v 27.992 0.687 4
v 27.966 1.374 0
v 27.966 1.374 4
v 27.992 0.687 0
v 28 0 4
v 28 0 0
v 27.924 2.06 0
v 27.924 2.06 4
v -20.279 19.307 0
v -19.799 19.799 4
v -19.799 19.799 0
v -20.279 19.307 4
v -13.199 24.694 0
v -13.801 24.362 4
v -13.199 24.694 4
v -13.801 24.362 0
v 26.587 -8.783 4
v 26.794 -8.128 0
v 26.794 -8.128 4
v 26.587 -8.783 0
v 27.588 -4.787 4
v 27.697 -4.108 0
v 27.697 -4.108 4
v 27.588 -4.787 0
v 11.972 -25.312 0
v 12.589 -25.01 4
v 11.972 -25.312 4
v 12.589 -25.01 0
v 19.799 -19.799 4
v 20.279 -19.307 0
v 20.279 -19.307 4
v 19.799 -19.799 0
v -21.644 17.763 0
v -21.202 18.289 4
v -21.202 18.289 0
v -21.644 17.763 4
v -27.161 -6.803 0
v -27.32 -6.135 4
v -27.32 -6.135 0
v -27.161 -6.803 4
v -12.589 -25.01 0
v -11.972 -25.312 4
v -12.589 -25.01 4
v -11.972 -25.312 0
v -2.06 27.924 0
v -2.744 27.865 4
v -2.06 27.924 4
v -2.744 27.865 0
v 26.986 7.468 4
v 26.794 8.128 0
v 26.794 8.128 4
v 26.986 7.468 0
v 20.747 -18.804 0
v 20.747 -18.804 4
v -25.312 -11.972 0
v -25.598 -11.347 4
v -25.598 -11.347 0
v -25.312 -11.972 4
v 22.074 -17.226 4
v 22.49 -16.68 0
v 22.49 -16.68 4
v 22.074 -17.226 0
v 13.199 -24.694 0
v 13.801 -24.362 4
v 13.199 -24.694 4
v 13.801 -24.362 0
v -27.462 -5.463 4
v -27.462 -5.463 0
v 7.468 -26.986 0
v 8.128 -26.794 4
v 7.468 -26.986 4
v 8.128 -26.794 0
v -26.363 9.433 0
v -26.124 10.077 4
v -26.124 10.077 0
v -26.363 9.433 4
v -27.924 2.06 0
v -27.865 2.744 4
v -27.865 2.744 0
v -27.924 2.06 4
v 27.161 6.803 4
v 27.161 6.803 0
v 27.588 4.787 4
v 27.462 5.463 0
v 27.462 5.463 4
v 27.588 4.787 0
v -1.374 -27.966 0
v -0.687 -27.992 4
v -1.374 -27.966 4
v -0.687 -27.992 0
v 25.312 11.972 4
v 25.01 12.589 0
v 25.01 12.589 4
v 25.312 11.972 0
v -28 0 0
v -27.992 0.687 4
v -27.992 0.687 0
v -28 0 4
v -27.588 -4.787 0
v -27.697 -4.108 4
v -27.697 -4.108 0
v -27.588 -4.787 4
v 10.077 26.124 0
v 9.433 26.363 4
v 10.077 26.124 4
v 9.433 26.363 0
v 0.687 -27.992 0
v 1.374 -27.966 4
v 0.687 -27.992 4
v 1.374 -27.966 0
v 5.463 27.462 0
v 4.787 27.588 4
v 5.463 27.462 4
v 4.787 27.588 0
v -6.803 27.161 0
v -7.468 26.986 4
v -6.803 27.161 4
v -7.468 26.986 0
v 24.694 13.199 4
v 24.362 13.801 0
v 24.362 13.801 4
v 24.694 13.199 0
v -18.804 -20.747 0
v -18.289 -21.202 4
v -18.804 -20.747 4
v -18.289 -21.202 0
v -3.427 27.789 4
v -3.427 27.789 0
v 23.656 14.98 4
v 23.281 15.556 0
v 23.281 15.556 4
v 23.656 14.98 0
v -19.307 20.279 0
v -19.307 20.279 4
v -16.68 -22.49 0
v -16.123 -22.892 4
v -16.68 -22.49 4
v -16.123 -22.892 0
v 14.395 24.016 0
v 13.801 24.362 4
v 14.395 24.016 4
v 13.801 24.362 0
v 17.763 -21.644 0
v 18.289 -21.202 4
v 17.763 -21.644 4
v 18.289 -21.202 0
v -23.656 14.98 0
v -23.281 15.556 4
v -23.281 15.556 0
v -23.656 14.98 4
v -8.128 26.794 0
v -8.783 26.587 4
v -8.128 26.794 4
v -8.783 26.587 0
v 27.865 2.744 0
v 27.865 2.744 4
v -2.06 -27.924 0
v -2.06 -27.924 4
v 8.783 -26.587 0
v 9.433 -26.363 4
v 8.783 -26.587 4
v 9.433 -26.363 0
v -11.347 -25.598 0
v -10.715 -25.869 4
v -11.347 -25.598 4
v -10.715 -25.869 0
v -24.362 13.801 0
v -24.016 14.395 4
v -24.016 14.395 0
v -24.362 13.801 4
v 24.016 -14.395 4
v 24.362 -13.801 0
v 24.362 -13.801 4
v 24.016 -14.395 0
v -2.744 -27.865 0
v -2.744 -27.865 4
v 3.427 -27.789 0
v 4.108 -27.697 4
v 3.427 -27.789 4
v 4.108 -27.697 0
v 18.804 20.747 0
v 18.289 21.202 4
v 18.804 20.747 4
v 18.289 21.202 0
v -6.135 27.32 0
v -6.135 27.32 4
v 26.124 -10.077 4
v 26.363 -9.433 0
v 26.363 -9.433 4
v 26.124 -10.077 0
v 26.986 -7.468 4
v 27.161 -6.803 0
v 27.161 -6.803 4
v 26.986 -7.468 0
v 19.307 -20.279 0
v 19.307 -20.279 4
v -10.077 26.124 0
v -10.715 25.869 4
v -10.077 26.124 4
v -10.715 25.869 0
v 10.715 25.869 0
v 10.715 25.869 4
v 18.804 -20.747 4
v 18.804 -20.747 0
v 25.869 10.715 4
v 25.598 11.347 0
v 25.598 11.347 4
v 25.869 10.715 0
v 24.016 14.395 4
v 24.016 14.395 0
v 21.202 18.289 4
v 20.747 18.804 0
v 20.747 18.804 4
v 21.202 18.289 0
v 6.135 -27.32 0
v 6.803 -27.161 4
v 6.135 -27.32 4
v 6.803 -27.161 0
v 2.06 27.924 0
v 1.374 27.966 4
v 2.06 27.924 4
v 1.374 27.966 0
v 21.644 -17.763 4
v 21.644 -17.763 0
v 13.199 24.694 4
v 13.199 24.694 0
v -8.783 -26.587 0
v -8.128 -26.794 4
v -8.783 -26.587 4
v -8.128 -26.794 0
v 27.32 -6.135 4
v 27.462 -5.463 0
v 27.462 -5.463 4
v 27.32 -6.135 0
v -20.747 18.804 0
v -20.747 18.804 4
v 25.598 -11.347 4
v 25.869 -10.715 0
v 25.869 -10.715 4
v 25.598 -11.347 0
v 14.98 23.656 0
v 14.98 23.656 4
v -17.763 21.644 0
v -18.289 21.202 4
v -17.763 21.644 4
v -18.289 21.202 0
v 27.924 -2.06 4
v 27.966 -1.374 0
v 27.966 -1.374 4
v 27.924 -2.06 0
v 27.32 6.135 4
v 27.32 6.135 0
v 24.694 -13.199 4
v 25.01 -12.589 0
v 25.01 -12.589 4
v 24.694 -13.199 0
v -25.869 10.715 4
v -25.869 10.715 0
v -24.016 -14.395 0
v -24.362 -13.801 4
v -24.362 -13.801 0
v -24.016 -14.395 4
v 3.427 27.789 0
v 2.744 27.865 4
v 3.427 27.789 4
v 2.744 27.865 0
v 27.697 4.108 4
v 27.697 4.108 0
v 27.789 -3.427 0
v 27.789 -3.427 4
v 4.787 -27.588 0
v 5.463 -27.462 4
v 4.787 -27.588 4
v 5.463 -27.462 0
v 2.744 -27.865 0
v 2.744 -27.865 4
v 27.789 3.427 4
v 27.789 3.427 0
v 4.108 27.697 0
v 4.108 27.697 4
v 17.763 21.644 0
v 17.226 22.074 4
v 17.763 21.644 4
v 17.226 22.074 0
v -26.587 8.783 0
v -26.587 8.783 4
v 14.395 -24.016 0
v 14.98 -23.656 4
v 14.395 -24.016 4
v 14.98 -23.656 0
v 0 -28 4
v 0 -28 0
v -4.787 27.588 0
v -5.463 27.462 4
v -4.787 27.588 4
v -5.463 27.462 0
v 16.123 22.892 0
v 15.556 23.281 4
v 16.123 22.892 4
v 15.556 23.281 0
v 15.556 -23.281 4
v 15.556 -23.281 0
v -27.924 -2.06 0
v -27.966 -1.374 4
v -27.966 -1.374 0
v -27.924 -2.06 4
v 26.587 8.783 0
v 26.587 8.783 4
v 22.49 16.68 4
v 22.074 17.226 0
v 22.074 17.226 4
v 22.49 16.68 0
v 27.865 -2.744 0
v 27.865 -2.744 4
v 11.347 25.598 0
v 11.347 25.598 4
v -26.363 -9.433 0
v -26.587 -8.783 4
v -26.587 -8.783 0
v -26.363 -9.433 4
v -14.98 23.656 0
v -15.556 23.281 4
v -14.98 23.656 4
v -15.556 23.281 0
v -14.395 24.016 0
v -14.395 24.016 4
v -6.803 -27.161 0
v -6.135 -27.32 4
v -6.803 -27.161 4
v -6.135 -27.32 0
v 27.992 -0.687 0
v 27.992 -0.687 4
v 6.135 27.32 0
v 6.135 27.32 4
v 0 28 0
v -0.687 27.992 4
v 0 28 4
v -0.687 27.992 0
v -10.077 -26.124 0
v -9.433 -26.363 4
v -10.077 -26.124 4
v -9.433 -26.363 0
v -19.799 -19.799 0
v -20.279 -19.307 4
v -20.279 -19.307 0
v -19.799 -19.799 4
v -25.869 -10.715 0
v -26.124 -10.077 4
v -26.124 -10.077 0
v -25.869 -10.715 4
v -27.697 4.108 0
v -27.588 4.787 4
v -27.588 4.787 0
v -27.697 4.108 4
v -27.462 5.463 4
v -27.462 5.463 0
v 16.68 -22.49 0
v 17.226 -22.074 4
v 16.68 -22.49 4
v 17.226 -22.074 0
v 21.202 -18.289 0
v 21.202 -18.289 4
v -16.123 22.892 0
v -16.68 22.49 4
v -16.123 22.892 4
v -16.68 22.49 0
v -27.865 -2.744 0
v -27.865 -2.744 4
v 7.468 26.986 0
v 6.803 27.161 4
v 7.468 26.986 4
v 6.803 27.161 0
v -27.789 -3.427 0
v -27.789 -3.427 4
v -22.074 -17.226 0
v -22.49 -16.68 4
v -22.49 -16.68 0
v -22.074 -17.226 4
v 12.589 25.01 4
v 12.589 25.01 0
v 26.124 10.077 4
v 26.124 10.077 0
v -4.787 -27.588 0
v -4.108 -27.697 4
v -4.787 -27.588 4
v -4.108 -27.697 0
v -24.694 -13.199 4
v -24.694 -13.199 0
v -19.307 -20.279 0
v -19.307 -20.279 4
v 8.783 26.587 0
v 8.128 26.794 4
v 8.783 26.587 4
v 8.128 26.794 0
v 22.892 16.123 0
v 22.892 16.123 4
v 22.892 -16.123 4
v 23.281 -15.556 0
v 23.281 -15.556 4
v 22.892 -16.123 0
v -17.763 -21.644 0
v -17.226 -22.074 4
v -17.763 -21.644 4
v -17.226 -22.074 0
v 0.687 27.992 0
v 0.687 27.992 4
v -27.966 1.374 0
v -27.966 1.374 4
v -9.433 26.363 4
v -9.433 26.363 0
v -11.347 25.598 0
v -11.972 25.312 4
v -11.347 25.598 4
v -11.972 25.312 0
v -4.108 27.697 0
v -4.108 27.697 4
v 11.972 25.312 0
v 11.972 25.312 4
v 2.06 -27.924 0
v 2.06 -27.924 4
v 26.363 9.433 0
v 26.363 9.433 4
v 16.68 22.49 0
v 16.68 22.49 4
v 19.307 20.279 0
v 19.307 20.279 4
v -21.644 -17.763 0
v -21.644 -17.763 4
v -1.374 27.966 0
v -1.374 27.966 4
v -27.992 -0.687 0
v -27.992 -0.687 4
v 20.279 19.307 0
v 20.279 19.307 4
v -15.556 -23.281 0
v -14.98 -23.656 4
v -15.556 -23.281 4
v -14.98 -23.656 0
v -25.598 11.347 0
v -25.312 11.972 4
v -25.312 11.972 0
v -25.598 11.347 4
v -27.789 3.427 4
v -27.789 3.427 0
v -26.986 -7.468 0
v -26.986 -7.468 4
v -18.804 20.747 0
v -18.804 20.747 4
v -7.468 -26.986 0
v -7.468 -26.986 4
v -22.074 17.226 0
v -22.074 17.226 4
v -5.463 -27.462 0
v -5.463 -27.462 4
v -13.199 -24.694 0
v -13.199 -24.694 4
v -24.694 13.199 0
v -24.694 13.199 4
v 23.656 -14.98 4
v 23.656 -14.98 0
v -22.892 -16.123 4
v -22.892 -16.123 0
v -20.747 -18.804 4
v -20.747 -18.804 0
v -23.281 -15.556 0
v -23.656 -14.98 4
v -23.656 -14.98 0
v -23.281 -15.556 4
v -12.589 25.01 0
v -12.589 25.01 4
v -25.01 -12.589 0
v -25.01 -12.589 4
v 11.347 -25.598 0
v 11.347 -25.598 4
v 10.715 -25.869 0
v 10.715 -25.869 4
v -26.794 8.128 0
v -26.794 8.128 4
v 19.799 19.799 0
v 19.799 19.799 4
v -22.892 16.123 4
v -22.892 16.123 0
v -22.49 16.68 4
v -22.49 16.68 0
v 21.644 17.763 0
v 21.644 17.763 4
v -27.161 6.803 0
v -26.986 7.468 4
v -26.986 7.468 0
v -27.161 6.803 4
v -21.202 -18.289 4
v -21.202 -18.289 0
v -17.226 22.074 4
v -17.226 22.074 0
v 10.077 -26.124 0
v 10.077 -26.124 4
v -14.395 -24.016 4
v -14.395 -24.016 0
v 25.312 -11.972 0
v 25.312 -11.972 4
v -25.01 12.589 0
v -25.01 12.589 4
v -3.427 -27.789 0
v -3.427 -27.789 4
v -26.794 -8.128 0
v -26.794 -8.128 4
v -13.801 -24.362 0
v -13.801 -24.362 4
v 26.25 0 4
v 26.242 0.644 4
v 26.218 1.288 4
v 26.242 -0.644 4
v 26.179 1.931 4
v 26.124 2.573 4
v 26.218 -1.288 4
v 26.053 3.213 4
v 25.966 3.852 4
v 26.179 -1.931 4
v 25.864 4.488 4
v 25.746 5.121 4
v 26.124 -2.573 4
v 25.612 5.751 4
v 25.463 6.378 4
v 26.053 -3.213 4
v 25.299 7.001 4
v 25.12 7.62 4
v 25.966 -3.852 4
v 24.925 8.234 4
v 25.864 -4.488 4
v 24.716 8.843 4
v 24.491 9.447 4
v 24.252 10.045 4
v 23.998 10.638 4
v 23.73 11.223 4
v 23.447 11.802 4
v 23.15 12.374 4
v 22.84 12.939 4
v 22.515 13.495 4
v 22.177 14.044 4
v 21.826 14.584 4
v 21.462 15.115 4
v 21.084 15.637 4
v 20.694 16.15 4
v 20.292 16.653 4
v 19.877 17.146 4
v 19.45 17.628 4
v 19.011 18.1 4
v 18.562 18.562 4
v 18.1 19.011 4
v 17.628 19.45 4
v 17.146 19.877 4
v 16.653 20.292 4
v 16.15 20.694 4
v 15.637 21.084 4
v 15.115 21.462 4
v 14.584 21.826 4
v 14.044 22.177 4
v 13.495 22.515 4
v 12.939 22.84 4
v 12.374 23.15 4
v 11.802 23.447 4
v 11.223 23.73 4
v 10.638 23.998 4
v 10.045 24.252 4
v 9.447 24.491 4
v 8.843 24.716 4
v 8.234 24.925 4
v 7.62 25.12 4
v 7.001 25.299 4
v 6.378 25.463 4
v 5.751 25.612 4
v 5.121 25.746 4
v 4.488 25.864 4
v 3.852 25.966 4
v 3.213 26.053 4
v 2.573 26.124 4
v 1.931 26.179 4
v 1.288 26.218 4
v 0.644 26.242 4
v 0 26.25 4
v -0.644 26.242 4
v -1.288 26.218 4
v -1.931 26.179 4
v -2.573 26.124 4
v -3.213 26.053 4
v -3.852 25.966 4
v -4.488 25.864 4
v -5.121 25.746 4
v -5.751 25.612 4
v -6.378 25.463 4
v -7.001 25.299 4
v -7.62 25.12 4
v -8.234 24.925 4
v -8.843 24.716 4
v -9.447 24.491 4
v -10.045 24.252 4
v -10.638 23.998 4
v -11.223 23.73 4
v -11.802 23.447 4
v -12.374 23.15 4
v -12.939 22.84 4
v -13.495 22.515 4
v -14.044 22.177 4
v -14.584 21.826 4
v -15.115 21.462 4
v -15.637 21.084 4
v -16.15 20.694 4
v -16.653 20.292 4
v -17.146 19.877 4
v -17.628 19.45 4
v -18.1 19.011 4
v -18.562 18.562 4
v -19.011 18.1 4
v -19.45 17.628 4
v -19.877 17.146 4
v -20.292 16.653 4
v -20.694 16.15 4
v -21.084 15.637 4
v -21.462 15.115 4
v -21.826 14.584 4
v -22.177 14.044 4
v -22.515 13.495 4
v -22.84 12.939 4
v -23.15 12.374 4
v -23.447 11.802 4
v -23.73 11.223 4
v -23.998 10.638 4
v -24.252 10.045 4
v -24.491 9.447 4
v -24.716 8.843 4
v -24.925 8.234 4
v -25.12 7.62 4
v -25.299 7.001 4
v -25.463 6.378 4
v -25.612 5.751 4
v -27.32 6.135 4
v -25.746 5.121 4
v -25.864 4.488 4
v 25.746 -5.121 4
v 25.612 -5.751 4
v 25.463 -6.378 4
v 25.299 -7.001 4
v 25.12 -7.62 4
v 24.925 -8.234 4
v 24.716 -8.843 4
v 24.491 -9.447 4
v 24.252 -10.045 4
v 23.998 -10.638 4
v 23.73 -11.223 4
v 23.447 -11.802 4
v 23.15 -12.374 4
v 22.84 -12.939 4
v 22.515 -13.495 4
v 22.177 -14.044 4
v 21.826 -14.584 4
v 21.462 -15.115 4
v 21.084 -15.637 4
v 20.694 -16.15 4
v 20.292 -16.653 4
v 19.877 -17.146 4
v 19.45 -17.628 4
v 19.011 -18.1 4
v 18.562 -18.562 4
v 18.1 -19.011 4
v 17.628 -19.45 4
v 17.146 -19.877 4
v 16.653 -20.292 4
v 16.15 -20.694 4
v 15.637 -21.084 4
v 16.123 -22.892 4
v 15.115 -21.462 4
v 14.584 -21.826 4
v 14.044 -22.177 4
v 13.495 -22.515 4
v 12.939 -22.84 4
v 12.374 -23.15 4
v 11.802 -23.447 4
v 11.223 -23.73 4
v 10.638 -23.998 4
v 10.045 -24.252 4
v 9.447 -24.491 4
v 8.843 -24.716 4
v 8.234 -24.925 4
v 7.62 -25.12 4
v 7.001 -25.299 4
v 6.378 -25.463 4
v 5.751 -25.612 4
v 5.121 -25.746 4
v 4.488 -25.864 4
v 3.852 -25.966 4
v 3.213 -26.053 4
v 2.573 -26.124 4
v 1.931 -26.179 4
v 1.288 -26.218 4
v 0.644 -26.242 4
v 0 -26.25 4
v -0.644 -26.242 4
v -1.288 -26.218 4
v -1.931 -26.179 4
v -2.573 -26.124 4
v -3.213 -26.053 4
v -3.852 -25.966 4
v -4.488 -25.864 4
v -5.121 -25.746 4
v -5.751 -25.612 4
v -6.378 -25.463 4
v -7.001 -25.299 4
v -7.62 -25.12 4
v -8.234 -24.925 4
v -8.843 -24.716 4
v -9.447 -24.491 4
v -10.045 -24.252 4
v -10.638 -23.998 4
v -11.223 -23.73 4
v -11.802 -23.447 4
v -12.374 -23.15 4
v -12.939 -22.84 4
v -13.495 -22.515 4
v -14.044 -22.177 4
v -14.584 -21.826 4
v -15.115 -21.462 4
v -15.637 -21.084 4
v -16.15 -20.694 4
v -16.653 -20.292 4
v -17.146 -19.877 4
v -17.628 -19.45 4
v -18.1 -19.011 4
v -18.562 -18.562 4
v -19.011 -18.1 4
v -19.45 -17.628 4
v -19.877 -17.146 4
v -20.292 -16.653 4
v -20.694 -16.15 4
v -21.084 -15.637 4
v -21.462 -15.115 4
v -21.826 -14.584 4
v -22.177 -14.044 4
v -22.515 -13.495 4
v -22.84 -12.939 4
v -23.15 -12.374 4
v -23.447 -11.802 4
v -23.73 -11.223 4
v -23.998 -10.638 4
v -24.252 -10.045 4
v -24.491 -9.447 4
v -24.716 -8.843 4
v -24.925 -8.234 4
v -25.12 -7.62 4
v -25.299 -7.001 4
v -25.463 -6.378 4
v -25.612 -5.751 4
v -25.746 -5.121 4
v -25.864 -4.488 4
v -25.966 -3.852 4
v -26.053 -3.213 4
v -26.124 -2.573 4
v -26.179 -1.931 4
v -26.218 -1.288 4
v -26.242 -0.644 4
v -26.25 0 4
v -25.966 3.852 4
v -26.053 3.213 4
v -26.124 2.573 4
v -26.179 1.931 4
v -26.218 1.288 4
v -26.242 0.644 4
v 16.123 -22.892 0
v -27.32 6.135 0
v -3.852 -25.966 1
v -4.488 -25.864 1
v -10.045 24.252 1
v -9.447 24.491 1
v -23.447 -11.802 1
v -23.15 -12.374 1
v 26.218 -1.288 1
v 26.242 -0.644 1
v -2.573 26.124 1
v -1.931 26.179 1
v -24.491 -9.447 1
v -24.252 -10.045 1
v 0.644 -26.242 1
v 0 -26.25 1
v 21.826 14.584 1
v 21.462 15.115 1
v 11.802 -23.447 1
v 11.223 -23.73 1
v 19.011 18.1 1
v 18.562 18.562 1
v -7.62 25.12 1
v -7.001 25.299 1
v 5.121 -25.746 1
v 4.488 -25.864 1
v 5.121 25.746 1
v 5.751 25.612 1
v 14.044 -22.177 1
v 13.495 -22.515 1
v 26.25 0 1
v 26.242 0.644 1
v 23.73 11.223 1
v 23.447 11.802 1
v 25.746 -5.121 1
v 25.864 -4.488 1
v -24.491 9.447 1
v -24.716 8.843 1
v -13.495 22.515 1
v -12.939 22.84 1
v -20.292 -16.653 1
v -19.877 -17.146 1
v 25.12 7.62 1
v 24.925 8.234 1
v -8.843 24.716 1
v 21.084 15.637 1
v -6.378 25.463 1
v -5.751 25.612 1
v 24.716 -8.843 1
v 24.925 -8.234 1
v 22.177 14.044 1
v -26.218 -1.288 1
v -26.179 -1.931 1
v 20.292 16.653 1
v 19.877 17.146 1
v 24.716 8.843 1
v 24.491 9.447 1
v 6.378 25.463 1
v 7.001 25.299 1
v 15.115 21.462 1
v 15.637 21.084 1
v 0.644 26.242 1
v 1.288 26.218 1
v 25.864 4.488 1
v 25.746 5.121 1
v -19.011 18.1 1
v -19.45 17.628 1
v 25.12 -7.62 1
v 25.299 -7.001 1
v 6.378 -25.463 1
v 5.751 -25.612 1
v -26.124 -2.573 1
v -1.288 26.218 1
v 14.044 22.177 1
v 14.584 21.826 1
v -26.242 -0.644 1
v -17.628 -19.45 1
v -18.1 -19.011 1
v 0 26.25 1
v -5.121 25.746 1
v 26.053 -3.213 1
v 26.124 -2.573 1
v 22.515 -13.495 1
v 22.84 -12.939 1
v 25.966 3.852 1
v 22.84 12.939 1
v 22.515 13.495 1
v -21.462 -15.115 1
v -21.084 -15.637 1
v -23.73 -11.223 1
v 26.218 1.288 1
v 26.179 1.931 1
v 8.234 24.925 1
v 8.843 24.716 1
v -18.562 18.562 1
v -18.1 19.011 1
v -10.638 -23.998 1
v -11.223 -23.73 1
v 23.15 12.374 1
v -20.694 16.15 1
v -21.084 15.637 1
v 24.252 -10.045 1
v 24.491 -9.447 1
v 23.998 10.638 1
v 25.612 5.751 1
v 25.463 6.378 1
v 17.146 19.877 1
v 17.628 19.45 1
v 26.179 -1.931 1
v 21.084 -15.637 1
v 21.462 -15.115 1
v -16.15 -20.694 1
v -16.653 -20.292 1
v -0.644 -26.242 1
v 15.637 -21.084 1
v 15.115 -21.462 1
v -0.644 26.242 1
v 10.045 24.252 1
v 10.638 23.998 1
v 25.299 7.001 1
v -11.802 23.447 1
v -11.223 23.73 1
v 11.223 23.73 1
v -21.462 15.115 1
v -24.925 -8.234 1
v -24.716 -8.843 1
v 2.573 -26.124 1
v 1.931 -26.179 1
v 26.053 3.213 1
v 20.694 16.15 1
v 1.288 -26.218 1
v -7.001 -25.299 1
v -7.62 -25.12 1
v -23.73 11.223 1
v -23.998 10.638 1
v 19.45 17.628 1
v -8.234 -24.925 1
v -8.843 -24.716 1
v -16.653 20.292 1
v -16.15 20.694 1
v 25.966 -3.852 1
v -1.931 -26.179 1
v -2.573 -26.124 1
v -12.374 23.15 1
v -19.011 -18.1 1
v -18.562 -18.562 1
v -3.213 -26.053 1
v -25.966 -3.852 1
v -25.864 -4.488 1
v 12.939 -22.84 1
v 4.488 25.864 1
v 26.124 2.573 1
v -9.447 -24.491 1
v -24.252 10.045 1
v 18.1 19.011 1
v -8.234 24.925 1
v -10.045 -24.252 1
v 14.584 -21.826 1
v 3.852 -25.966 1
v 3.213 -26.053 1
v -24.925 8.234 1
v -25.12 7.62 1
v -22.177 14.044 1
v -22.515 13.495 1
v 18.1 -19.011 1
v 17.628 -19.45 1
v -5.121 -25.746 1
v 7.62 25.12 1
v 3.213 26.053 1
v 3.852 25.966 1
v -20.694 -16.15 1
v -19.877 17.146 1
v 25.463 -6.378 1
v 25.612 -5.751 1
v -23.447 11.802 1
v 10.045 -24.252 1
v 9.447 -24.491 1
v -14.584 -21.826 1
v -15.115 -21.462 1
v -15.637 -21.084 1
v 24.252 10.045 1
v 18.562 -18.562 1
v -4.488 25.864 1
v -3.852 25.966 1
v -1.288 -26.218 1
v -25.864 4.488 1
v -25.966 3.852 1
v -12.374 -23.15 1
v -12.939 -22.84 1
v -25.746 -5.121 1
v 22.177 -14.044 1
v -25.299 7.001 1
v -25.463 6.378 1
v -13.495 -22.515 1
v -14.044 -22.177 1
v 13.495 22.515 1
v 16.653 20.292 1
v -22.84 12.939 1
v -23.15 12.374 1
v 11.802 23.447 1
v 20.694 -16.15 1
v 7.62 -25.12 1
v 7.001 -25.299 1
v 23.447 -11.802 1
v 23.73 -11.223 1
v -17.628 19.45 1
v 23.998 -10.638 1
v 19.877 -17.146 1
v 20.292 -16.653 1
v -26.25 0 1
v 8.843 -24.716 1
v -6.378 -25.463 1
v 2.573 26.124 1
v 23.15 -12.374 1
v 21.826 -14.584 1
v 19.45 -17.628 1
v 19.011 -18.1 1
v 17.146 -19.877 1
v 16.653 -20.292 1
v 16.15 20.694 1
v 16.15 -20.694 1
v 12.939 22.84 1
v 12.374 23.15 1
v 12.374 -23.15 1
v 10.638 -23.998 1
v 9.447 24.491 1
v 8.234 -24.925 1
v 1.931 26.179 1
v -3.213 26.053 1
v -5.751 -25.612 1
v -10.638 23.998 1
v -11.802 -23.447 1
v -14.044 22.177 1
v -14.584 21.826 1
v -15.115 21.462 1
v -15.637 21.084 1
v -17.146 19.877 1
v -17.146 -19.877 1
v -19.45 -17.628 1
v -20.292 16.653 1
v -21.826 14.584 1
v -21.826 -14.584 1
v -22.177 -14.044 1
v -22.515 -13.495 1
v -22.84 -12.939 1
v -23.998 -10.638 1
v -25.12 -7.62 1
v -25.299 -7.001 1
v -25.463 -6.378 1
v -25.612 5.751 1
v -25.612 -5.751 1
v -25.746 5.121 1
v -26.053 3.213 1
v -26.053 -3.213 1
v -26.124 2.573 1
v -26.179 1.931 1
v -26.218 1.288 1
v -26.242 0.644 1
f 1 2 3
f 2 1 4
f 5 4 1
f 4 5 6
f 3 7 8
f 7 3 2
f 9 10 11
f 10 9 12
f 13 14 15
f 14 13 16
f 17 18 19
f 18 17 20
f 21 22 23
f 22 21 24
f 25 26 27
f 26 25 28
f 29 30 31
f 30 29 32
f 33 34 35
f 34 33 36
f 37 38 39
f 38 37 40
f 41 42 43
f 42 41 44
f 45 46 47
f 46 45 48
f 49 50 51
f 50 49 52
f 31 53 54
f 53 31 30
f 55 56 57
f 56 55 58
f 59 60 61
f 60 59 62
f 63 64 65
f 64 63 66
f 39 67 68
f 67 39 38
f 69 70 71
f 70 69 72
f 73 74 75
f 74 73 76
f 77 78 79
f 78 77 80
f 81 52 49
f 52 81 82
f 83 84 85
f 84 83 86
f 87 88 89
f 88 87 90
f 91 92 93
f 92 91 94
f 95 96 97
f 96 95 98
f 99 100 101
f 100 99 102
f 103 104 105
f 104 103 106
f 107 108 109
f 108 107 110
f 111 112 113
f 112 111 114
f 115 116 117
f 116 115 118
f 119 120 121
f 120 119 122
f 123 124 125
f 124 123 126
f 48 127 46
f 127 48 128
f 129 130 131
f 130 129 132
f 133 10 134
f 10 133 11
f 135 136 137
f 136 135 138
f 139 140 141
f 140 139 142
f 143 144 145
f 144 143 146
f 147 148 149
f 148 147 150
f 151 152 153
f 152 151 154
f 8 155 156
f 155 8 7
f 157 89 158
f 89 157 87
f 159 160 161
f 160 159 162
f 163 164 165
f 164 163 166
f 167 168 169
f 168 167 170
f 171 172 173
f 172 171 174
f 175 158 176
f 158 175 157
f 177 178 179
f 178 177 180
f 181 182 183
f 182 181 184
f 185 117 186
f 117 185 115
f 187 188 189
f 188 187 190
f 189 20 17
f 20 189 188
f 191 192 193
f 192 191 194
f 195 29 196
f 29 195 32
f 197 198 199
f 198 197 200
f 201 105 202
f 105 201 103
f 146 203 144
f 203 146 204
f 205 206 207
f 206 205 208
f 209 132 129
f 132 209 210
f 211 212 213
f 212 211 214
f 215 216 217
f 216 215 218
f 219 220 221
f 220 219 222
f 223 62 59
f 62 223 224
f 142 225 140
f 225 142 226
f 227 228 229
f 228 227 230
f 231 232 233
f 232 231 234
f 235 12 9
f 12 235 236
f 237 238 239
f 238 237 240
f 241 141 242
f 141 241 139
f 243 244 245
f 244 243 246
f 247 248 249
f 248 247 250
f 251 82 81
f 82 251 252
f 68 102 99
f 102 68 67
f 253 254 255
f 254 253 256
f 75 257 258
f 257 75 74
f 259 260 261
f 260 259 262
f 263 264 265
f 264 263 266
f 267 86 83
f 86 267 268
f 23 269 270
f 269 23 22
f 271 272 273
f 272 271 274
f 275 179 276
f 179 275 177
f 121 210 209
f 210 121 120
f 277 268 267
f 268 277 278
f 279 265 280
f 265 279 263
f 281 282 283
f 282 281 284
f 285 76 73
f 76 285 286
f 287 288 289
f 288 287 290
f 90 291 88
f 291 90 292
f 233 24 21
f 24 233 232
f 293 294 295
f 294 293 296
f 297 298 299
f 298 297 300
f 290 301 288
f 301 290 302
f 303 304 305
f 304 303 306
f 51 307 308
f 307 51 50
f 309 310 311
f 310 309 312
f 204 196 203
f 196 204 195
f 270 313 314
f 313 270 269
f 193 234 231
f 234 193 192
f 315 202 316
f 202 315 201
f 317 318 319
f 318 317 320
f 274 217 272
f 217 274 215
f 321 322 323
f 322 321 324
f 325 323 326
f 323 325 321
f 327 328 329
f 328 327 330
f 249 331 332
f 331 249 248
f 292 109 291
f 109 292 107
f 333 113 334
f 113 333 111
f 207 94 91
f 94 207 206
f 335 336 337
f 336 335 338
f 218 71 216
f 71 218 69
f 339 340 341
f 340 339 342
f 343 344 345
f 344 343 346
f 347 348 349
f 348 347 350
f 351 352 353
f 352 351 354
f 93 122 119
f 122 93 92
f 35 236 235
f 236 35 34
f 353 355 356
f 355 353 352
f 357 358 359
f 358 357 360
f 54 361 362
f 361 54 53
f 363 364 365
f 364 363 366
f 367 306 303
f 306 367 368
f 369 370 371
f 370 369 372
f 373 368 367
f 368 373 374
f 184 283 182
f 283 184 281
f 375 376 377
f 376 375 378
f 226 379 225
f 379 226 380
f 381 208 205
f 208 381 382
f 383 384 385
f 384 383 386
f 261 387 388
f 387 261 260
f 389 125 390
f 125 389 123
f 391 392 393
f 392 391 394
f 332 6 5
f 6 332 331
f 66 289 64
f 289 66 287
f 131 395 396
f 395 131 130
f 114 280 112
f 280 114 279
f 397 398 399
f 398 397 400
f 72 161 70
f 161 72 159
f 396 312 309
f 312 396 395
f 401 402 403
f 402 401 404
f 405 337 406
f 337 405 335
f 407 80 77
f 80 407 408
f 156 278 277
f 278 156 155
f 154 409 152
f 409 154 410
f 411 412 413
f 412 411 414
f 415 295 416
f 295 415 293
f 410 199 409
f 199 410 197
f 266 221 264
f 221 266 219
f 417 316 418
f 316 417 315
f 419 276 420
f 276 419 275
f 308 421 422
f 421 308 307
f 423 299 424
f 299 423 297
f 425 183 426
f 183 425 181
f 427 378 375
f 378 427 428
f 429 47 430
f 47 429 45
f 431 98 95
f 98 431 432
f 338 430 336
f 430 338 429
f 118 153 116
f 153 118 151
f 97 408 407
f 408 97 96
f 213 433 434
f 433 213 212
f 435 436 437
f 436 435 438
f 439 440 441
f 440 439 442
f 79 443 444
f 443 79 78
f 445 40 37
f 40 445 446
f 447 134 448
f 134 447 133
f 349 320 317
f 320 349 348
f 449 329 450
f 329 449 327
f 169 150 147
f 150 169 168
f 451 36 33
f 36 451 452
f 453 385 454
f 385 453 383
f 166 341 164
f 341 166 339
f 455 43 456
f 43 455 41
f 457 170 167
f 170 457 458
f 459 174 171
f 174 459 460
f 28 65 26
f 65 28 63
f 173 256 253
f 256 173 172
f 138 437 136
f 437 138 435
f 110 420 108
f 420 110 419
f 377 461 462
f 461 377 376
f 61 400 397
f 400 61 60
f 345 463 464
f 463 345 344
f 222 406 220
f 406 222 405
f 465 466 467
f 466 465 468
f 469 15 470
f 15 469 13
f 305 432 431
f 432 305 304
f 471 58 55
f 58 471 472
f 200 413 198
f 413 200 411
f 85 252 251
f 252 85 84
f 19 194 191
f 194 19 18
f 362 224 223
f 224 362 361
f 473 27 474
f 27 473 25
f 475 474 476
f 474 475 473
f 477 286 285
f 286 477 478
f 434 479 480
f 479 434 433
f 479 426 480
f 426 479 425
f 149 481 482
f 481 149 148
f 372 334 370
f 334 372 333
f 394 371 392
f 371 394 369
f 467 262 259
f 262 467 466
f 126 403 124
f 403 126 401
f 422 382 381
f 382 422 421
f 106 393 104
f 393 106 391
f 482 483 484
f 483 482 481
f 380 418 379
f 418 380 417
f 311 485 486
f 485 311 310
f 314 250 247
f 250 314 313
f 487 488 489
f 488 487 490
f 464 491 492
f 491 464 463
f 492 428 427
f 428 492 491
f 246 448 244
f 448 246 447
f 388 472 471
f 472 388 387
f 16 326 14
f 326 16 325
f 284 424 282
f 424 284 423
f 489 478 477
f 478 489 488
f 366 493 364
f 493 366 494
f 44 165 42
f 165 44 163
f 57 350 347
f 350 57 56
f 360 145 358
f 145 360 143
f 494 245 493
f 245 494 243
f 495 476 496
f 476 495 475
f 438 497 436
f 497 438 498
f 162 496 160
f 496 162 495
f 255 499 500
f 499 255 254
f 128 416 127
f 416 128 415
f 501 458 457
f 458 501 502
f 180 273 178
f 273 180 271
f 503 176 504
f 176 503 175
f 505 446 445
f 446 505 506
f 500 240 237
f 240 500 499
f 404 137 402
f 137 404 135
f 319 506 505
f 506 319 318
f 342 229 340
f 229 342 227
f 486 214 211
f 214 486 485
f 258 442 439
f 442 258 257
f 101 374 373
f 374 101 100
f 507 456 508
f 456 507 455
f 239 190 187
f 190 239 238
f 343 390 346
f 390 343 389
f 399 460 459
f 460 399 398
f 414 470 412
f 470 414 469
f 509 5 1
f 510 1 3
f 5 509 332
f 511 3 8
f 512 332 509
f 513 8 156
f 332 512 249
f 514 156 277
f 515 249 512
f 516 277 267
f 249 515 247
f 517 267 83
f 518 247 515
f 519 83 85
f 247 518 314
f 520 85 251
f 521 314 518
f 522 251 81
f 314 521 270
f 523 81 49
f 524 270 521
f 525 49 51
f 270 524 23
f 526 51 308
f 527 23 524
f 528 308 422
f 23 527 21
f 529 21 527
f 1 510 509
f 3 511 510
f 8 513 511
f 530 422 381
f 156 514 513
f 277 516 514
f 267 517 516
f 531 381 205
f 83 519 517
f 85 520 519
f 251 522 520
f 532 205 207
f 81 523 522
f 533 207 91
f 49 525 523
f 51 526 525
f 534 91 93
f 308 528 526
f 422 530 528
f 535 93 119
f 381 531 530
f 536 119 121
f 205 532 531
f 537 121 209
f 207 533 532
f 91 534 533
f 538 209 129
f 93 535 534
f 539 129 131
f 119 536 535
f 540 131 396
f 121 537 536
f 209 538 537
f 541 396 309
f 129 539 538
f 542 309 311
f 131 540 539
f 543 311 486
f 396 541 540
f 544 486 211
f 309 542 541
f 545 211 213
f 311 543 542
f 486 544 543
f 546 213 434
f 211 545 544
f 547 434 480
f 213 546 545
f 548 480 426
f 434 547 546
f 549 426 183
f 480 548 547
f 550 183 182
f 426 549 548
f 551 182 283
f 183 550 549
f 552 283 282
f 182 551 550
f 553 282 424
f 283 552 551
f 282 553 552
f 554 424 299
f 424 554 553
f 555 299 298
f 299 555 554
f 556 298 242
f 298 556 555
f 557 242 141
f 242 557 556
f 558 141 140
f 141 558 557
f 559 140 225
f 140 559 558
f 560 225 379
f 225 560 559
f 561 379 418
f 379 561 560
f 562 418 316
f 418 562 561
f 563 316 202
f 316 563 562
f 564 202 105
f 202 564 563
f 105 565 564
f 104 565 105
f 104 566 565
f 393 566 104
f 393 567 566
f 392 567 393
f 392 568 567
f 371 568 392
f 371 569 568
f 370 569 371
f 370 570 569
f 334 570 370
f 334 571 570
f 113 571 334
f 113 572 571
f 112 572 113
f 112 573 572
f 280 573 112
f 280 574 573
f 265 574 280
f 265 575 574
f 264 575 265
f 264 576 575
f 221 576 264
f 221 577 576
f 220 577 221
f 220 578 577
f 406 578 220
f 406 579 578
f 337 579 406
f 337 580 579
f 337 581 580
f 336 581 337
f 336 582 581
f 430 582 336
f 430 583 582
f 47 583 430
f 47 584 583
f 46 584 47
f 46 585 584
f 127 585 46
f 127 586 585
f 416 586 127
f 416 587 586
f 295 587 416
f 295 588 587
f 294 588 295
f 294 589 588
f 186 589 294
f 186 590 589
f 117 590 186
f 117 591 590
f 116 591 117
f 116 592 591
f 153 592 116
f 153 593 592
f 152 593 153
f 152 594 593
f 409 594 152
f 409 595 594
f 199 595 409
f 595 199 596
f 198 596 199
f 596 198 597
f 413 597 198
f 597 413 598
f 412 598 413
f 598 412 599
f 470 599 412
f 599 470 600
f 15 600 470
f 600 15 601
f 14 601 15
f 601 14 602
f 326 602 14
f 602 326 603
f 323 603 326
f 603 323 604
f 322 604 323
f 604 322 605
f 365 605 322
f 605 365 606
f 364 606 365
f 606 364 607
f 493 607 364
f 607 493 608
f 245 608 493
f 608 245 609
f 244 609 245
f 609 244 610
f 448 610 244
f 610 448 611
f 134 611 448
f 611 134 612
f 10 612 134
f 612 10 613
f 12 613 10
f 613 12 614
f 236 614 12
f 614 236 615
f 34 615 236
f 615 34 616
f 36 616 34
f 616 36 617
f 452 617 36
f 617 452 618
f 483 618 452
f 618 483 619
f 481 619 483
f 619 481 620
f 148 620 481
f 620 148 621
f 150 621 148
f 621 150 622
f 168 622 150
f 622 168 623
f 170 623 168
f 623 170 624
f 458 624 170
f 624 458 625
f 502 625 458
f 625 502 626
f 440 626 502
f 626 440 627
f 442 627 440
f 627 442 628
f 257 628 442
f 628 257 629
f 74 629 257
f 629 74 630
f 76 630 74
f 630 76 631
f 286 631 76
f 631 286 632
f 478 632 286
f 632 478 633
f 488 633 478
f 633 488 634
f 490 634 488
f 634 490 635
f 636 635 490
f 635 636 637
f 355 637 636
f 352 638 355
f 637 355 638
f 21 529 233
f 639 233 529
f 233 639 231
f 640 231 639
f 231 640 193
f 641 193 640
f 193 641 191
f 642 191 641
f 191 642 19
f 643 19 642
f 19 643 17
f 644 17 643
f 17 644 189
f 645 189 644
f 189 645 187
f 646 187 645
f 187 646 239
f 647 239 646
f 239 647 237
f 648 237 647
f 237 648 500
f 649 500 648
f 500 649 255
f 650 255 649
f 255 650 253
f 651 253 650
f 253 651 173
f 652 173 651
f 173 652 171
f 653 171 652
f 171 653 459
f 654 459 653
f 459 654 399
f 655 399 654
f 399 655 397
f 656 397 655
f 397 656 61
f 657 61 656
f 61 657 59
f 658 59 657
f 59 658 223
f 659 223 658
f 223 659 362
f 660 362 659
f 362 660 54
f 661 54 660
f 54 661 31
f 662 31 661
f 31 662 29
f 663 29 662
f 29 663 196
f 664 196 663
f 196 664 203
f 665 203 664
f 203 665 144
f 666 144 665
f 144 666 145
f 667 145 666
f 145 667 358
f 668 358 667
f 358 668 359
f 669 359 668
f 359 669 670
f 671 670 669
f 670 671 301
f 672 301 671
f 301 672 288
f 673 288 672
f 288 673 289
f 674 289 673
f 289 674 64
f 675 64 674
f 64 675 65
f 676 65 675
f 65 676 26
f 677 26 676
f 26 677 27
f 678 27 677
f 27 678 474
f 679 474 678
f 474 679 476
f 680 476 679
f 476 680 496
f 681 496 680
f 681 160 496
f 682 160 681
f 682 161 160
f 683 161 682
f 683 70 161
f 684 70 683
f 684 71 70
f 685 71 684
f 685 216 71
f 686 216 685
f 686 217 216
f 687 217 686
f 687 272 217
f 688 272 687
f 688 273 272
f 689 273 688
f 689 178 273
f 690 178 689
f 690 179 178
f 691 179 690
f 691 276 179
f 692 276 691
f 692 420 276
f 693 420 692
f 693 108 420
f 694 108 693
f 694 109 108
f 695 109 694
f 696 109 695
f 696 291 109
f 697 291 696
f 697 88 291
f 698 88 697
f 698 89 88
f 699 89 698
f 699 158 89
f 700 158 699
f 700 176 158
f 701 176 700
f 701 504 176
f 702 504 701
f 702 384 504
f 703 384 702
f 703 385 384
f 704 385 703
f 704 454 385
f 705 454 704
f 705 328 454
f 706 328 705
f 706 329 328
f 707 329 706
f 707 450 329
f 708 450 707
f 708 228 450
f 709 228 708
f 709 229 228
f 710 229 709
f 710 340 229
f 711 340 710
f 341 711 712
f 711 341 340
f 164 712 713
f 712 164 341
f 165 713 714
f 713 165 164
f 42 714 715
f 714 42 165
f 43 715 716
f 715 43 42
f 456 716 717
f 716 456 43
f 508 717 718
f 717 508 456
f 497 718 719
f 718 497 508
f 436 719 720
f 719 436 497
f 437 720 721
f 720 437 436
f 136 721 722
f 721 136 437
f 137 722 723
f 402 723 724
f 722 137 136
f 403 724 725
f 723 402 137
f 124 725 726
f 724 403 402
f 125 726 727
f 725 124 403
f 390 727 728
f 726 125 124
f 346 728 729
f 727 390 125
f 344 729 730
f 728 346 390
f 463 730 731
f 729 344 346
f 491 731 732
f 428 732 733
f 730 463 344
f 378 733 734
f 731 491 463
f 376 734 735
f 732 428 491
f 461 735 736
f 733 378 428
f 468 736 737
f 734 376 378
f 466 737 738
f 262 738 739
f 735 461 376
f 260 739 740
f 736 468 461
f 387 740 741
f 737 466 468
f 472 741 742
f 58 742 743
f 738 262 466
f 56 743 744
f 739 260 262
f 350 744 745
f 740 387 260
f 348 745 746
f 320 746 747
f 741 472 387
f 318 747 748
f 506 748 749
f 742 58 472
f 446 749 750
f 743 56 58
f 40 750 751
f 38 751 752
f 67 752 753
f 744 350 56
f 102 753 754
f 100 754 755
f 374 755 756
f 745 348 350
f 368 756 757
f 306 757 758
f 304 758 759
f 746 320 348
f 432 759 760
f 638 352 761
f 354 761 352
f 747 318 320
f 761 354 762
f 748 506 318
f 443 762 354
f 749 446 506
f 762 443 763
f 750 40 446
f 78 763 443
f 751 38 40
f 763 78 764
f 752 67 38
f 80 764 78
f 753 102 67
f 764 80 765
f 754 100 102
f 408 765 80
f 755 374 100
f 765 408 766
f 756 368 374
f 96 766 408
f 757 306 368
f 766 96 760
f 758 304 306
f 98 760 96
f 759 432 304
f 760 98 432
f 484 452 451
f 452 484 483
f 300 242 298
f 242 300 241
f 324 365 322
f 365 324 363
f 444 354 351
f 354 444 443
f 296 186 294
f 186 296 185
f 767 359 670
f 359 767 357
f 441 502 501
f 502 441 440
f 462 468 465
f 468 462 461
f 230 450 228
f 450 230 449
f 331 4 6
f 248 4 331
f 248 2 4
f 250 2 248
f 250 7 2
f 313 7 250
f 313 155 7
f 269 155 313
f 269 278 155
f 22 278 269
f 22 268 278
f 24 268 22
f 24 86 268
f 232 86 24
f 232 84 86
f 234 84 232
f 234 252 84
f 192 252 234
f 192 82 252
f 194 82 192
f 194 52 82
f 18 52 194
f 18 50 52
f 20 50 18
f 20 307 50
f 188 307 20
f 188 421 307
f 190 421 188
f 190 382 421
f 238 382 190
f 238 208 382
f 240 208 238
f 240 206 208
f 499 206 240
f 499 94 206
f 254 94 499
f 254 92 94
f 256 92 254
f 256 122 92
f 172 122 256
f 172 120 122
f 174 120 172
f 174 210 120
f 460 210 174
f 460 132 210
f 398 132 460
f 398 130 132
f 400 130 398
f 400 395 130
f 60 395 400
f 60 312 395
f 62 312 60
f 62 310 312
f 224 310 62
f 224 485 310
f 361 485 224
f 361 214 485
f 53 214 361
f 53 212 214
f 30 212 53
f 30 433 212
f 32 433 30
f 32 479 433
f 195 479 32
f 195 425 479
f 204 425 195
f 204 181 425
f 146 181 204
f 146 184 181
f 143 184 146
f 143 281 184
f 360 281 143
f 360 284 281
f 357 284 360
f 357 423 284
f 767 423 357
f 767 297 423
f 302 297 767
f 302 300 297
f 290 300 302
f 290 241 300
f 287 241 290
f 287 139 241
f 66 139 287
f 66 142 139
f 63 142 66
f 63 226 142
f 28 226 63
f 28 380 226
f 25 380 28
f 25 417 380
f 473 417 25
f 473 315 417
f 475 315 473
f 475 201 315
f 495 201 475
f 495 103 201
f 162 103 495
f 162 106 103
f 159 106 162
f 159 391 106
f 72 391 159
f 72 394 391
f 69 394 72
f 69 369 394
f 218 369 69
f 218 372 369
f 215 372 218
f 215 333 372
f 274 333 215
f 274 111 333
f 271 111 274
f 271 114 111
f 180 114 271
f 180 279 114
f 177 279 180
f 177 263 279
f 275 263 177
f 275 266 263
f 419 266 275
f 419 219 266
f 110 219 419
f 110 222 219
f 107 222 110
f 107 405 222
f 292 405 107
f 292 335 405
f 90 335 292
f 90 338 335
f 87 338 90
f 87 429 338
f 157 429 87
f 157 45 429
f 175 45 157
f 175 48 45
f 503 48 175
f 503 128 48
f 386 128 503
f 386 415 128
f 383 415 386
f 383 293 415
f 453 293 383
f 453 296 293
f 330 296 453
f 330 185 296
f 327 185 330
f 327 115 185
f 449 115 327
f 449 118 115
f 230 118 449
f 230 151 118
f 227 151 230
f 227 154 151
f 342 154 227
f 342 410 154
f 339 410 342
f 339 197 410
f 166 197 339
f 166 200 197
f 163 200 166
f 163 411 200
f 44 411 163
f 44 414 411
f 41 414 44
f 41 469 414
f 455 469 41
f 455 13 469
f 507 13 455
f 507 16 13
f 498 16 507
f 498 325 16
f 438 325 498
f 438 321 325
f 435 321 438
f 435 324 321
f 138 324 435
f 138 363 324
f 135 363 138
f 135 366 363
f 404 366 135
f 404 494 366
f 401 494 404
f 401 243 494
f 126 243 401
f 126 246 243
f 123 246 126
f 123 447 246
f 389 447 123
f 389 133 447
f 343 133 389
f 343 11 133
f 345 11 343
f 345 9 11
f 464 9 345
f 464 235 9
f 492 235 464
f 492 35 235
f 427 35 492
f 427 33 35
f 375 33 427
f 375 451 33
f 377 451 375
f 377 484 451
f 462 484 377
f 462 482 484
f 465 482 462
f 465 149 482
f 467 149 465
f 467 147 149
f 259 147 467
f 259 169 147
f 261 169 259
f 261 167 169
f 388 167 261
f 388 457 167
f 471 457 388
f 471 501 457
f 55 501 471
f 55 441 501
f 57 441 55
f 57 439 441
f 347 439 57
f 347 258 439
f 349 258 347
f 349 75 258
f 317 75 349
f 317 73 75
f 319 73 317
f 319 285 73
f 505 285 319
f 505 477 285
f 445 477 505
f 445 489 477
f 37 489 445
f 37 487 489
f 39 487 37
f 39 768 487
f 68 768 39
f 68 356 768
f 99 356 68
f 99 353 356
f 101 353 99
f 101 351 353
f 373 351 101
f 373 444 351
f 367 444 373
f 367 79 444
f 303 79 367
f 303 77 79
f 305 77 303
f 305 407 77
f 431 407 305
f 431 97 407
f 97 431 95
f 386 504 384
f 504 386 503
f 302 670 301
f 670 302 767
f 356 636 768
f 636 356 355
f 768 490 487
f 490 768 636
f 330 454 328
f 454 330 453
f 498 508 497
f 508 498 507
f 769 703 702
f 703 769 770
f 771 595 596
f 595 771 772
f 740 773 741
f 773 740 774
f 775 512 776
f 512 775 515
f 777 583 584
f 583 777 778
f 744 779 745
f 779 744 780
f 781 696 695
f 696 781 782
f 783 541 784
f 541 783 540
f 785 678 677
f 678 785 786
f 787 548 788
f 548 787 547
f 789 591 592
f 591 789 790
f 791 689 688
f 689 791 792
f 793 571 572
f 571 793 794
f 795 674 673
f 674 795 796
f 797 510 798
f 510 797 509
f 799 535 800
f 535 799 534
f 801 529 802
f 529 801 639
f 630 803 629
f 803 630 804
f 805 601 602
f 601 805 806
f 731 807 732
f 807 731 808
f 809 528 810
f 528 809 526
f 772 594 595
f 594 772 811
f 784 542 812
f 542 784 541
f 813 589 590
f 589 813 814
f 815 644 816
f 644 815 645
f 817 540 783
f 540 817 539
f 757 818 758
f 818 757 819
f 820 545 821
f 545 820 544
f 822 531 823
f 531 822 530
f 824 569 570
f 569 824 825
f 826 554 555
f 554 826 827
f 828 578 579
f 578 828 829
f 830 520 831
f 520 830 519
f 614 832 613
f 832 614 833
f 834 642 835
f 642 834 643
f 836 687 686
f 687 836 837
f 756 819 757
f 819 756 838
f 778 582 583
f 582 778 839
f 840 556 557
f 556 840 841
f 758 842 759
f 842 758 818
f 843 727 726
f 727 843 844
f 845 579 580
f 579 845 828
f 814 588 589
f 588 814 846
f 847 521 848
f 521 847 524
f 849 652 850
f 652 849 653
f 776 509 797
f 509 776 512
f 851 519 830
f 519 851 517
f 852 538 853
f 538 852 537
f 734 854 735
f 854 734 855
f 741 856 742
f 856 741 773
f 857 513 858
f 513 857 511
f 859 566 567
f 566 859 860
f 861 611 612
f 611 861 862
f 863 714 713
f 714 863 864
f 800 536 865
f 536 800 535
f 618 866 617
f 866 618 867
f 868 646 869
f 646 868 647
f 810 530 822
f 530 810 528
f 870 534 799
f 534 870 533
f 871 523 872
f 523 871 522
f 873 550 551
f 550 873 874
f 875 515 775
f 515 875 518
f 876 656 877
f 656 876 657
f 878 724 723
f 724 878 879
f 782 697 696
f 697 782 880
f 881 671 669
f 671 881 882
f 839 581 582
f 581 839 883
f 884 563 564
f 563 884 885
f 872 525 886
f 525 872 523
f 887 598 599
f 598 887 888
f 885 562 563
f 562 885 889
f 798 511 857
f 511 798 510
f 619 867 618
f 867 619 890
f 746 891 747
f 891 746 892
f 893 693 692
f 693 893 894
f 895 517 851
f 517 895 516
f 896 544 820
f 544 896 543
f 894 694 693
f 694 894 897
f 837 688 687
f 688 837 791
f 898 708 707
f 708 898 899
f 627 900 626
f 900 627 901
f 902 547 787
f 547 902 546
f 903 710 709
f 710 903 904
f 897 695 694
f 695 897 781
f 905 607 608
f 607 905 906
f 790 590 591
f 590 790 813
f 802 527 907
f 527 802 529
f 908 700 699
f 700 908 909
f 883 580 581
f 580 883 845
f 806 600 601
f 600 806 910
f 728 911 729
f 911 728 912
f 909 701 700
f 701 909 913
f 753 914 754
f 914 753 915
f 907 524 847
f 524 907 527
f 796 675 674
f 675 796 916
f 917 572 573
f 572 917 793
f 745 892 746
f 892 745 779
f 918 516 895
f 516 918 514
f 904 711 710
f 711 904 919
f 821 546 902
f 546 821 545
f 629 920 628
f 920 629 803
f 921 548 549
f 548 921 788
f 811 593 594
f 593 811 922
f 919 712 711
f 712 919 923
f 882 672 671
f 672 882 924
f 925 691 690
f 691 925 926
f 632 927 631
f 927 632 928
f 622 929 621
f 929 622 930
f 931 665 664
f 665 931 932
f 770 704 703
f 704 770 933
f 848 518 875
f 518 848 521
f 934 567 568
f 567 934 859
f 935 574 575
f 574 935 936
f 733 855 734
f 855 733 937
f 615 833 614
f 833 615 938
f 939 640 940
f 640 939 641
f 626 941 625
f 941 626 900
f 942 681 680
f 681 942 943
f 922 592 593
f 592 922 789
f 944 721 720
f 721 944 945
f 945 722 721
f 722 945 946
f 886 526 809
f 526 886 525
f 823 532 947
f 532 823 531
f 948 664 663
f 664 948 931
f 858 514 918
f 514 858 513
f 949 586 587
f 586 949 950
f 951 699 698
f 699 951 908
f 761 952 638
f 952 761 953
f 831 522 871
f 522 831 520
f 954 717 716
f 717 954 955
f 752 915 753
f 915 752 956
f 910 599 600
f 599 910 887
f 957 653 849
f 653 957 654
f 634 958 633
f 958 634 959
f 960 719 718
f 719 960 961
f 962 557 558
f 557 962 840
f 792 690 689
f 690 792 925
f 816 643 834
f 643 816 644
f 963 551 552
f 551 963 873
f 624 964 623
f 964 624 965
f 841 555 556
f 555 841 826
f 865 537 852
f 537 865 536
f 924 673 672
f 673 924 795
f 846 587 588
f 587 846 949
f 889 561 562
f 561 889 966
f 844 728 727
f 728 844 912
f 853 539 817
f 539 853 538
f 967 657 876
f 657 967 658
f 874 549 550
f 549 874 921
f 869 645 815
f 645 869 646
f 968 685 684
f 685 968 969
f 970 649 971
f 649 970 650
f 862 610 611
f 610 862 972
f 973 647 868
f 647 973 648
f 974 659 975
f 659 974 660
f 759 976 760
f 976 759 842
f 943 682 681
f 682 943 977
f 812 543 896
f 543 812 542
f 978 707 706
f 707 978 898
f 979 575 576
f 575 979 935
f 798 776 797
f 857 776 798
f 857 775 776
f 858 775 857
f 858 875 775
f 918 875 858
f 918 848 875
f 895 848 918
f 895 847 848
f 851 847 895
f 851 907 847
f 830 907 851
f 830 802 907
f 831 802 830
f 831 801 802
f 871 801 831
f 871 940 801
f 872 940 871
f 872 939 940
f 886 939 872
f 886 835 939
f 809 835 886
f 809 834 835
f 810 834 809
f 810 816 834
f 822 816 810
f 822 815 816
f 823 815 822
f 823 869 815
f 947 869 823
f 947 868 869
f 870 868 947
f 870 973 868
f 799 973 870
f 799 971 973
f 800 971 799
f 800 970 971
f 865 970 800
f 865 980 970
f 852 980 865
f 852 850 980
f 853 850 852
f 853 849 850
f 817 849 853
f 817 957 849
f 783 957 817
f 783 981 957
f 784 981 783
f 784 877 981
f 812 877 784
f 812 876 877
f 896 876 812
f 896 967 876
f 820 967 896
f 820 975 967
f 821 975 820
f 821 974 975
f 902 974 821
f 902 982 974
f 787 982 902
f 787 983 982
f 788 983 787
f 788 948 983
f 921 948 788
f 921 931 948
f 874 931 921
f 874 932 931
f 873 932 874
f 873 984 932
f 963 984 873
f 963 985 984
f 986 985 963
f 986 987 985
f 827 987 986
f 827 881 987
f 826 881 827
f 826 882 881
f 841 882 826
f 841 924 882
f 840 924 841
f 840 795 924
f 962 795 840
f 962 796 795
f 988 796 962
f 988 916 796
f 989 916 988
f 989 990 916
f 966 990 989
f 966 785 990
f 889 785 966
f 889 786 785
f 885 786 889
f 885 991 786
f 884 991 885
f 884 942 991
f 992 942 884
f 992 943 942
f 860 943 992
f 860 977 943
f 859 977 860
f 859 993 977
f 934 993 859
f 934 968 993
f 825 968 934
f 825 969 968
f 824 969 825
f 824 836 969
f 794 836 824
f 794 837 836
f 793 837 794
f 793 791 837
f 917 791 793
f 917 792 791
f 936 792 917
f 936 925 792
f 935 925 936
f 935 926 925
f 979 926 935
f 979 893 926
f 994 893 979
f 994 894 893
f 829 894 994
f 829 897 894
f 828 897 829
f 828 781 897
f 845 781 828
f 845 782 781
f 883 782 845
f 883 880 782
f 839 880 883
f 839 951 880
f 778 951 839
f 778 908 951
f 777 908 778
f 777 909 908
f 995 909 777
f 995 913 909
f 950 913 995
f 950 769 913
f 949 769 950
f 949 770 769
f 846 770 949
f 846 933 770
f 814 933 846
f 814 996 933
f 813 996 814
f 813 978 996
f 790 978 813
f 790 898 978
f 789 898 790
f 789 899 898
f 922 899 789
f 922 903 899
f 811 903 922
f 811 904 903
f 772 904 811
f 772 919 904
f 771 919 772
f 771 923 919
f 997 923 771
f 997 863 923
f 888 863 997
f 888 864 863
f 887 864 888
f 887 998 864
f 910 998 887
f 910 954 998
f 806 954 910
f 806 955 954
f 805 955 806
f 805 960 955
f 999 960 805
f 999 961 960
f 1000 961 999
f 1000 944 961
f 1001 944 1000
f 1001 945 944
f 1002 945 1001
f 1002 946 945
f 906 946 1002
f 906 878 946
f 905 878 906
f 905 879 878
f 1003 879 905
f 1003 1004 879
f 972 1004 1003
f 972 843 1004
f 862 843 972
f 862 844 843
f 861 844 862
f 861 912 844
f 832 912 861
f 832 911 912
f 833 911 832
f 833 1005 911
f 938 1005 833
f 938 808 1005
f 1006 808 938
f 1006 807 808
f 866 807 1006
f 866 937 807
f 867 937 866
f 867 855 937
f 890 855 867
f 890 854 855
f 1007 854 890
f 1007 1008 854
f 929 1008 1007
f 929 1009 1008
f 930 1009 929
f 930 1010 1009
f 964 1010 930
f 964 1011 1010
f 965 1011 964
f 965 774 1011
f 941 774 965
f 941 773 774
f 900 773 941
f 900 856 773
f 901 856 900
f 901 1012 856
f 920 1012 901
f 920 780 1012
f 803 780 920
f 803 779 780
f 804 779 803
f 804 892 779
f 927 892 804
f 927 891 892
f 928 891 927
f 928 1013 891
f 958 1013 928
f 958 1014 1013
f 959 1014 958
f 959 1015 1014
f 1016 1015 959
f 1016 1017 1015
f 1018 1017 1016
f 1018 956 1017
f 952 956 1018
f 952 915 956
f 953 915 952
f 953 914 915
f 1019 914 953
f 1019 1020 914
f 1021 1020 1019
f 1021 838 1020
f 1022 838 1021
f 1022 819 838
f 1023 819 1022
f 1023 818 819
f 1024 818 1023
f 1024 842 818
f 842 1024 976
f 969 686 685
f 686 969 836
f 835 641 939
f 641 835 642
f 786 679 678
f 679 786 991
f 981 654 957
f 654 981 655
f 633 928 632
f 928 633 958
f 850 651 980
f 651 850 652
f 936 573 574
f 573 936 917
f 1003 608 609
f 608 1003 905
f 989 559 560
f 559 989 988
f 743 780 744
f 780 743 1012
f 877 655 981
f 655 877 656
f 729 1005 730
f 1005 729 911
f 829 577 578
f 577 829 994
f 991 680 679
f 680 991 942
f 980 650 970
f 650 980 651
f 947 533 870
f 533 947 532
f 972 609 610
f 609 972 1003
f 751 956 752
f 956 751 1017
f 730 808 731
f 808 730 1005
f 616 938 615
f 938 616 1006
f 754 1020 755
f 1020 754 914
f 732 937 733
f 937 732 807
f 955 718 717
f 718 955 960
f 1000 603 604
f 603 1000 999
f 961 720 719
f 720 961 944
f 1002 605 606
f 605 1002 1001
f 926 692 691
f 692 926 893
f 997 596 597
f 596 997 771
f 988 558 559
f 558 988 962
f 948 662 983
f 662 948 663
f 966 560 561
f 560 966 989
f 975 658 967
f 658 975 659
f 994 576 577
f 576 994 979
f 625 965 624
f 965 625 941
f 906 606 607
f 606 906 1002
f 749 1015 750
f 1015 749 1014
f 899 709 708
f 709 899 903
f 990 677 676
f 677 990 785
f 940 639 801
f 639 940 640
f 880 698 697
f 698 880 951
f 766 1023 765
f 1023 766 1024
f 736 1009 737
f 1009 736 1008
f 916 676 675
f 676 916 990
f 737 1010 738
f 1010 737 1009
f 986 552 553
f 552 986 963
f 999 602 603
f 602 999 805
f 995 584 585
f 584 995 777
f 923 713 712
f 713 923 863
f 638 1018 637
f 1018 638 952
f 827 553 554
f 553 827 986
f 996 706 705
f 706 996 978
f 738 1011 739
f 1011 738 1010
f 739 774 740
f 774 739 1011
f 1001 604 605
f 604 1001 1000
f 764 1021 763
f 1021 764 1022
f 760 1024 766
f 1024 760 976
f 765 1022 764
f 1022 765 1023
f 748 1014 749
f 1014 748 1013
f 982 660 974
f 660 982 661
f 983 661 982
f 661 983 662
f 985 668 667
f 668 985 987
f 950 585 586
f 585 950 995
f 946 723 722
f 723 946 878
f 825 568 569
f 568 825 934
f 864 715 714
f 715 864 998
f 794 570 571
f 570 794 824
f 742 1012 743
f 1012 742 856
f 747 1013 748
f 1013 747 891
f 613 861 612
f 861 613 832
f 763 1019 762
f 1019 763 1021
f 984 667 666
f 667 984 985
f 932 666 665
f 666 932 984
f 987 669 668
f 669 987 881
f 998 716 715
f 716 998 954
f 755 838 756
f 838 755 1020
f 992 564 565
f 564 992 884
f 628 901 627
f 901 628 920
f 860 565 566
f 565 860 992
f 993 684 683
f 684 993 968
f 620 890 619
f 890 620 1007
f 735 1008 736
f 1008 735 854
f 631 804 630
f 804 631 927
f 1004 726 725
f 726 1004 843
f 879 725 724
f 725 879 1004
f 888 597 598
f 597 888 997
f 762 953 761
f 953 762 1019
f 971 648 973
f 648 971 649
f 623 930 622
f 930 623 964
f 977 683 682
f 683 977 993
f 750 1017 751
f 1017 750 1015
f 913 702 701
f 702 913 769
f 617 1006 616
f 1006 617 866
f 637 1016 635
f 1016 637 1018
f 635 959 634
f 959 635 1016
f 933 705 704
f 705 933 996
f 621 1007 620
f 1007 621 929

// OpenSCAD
$fn=256;

difference() {
  cylinder(d =56, h = 4); 
  translate([0,0,1]) cylinder(d =52.5, h = 6);  
}
